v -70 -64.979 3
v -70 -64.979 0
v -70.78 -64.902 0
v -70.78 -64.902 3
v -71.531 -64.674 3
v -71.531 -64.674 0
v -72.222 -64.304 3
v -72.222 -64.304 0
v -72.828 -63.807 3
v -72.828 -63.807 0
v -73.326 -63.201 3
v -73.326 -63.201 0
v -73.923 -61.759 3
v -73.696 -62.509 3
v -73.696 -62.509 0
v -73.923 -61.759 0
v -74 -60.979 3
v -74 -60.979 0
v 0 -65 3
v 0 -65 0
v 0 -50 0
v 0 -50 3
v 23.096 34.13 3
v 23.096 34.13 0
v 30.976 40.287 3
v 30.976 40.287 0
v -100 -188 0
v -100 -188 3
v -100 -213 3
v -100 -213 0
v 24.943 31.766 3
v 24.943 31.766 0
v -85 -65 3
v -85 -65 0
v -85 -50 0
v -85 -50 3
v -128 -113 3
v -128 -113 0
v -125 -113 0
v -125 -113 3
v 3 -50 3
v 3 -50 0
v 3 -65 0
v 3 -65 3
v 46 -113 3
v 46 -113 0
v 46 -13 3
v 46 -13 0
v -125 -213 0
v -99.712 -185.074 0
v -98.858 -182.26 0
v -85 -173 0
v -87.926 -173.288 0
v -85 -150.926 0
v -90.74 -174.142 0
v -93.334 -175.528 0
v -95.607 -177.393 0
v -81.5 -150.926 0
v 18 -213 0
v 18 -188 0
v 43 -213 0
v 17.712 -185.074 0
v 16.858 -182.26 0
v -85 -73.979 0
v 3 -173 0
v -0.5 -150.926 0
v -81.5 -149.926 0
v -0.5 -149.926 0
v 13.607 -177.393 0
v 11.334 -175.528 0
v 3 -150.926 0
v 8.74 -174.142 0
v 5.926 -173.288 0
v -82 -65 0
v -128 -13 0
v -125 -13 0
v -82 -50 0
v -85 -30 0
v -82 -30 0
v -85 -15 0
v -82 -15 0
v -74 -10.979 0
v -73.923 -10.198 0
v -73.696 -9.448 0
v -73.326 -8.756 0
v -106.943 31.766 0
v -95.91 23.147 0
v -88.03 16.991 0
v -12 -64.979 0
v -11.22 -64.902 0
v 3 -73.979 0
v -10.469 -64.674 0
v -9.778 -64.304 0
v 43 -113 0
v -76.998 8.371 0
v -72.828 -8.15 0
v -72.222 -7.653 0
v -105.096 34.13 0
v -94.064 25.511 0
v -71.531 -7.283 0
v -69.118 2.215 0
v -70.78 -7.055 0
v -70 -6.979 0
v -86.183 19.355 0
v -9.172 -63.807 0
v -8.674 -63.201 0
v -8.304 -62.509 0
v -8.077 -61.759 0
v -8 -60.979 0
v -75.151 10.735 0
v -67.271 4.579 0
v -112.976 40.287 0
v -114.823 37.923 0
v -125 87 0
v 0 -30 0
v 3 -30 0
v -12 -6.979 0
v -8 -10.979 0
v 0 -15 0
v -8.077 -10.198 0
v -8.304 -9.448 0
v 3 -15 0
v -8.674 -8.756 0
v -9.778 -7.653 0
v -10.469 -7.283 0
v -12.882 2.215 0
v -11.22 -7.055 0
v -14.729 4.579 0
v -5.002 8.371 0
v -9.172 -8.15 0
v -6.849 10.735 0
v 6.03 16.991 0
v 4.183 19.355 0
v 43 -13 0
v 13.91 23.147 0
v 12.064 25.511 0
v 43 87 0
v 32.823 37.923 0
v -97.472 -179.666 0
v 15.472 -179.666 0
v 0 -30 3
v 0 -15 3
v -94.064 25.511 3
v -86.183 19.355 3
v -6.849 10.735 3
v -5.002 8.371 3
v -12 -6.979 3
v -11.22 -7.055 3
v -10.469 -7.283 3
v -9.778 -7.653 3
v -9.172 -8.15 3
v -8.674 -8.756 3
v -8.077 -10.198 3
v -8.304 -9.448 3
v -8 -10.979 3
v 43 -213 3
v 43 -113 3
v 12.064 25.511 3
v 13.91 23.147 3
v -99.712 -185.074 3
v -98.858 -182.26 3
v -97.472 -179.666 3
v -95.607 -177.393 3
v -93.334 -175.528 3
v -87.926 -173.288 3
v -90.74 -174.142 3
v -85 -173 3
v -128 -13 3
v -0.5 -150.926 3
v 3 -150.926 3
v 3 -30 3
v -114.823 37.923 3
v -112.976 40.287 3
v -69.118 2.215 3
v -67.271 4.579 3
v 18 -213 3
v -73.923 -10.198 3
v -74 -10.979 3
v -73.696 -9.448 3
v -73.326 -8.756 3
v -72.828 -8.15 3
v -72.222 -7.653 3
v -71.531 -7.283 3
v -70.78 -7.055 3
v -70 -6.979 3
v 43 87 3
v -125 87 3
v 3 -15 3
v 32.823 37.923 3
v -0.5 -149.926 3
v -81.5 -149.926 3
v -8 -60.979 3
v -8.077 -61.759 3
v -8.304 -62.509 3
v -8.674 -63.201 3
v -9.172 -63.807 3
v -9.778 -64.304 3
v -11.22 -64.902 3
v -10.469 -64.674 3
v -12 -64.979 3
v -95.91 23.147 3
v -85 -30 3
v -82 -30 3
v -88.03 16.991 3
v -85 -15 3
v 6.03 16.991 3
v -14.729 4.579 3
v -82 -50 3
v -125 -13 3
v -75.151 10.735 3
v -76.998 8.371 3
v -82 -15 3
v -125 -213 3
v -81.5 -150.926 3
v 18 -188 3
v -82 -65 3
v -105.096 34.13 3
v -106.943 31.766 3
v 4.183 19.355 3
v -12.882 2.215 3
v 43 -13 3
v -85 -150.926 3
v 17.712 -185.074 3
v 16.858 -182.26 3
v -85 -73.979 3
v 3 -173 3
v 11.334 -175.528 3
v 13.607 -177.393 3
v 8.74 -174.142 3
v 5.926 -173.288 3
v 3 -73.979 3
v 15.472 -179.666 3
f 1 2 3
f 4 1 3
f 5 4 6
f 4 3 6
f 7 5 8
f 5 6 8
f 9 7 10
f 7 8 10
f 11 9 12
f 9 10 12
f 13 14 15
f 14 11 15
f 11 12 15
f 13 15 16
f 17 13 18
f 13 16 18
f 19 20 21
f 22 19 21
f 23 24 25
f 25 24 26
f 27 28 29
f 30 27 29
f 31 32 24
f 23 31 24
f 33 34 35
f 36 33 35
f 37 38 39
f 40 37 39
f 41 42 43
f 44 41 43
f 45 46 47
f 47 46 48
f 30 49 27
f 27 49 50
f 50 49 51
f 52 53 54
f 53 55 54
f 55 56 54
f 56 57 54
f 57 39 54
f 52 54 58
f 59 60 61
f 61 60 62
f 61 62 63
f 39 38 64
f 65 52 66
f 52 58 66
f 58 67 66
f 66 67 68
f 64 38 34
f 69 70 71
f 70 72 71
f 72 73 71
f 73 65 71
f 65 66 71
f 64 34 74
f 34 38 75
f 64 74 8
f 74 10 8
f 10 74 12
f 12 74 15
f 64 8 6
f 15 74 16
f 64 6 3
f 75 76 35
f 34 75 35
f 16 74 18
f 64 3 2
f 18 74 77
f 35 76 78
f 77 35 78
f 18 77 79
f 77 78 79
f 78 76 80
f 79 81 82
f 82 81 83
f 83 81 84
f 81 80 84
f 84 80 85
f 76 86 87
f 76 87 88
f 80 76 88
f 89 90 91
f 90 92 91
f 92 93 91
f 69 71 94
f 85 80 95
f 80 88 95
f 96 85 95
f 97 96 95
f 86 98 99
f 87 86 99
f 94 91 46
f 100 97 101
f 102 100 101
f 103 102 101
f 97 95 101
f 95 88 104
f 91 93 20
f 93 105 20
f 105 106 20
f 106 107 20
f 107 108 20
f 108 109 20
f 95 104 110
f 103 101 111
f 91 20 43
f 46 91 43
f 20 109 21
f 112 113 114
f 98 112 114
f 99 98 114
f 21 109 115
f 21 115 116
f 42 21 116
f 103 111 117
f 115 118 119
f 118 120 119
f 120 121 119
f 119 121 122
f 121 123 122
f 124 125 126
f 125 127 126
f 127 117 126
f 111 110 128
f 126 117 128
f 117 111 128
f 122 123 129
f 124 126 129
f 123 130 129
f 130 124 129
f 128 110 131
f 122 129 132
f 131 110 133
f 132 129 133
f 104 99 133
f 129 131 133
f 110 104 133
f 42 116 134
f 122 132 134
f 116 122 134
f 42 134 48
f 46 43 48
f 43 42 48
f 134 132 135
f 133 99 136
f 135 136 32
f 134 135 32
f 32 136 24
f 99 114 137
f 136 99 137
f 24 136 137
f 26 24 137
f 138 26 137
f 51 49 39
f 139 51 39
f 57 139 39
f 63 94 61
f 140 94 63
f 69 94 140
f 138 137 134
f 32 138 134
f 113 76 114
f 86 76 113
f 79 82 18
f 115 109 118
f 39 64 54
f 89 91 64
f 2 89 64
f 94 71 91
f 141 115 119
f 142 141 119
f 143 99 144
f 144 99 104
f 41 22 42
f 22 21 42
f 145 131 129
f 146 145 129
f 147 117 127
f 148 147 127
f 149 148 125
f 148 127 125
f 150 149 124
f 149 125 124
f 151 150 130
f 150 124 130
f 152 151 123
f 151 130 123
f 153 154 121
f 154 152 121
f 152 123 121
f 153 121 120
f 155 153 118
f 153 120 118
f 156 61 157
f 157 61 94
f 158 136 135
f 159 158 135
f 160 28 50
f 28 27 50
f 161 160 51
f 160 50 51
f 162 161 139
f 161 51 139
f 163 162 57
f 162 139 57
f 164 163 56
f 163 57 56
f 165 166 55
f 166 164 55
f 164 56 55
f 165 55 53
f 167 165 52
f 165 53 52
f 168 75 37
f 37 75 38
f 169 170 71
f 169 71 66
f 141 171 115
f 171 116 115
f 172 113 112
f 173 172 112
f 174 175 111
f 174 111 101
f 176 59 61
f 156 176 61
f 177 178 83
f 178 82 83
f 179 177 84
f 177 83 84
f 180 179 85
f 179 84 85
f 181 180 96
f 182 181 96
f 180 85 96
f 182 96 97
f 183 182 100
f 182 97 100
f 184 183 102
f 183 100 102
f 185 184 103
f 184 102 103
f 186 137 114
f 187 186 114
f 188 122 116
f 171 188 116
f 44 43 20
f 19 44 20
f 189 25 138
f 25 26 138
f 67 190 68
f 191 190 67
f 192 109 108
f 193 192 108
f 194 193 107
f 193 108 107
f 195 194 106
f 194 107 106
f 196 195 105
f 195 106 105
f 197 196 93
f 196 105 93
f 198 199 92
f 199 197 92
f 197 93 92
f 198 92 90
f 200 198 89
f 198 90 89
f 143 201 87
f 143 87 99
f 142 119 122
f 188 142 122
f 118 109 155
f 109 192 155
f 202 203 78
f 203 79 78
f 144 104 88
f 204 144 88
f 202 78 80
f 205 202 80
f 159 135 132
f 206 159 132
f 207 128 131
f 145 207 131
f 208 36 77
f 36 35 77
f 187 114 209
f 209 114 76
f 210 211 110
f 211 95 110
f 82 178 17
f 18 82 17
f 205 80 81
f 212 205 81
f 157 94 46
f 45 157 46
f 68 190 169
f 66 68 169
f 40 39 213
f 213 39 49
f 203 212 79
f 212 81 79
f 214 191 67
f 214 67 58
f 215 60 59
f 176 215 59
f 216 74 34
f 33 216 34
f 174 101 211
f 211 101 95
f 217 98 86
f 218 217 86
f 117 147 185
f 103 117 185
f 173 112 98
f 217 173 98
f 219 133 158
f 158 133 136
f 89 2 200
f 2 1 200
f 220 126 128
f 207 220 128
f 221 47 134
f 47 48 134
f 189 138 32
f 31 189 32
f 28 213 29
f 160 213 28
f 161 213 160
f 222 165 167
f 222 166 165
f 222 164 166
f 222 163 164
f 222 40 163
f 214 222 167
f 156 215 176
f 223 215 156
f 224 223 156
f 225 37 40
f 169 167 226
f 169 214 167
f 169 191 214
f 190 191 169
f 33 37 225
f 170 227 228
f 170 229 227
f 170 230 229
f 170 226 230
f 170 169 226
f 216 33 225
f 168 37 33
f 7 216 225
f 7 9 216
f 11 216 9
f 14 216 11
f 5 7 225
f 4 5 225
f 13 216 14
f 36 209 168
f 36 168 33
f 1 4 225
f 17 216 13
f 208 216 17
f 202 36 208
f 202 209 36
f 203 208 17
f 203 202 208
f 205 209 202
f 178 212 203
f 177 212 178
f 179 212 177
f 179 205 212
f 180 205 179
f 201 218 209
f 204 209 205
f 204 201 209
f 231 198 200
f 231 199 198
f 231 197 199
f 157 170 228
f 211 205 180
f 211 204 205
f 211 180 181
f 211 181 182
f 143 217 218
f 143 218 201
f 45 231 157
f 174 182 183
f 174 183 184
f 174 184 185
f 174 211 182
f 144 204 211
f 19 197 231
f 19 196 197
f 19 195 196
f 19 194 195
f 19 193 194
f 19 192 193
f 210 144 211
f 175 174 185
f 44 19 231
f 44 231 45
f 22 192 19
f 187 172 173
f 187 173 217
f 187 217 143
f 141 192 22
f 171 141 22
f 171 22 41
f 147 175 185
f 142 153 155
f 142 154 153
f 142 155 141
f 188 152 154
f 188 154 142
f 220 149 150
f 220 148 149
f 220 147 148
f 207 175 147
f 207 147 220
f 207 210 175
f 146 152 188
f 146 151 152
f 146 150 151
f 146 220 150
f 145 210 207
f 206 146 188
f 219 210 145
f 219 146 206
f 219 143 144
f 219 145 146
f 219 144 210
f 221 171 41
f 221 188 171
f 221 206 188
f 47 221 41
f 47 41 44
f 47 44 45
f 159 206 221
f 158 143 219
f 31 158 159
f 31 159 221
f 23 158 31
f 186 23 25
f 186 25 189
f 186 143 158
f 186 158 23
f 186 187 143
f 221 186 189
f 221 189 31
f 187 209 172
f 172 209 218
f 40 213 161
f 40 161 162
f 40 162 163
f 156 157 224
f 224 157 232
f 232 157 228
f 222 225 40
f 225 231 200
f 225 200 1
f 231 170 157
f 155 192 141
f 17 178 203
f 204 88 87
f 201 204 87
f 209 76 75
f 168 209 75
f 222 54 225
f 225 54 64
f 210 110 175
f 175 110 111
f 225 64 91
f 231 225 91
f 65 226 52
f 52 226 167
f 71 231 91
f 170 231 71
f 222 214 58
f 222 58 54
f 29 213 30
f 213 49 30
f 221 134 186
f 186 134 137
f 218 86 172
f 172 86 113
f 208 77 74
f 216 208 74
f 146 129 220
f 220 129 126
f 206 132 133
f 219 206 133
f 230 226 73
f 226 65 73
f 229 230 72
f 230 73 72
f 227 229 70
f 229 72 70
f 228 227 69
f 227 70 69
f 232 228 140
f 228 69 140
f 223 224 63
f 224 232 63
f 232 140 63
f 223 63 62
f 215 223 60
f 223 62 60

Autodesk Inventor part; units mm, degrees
ref_plane "YZ Plane" through (0, 0, 0) normal (1, 0, 0) x (0, 1, 0)
ref_plane "XZ Plane" through (0, 0, 0) normal (0, 1, 0) x (-1, 0, 0)
ref_plane "XY Plane" through (0, 0, 0) normal (0, 0, 1) x (1, 0, 0)
sketch "Sketch1" plane through (0, 0, 0) normal (0, 0, 1) x (1, 0, 0)
  line L0 (-76.9983, 8.3713) -> (-75.1513, 10.7353) projected
  line L1 (-75.1513, 10.7353) -> (-67.2712, 4.5787) projected
  line L2 (-67.2712, 4.5787) -> (-69.1182, 2.2147) projected
  line L3 (-69.1182, 2.2147) -> (-76.9983, 8.3713) projected
  line L4 (-86.1834, 19.3546) -> (-88.0304, 16.9906) projected
  line L5 (-88.0304, 16.9906) -> (-95.9105, 23.1472) projected
  line L6 (-95.9105, 23.1472) -> (-94.0636, 25.5112) projected
  line L7 (-94.0636, 25.5112) -> (-86.1834, 19.3546) projected
  line L8 (-106.9427, 31.7664) -> (-114.8228, 37.9231) projected
  line L9 (-114.8228, 37.9231) -> (-112.9758, 40.2871) projected
  line L10 (-112.9758, 40.2871) -> (-105.0957, 34.1305) projected
  line L11 (-105.0957, 34.1305) -> (-106.9427, 31.7664) projected
  line L12 (-6.8487, 10.7353) -> (-5.0017, 8.3713) projected
  line L13 (-5.0017, 8.3713) -> (-12.8818, 2.2147) projected
  line L14 (-12.8818, 2.2147) -> (-14.7288, 4.5787) projected
  line L15 (-14.7288, 4.5787) -> (-6.8487, 10.7353) projected
  line L16 (6.0304, 16.9906) -> (4.1834, 19.3546) projected
  line L17 (4.1834, 19.3546) -> (12.0636, 25.5112) projected
  line L18 (12.0636, 25.5112) -> (13.9105, 23.1472) projected
  line L19 (13.9105, 23.1472) -> (6.0304, 16.9906) projected
  line L20 (32.8228, 37.9231) -> (24.9427, 31.7664) projected
  line L21 (24.9427, 31.7664) -> (23.0957, 34.1305) projected
  line L22 (23.0957, 34.1305) -> (30.9758, 40.2871) projected
  line L23 (30.9758, 40.2871) -> (32.8228, 37.9231) projected
  line L24 (-82, 0) -> (-82, -73.9786) construction
  line L25 (-82, -73.9786) -> (-82, -147.5817) construction
  line L26 (-82, -147.5817) -> (-85, -147.5817)
  line L27 (-85, -147.5817) -> (-85, -73.9786)
  line L28 (-85, -73.9786) -> (-85, 0) construction
  line L29 (-85, 0) -> (-82, 0) construction
  line L30 (-85, -73.9786) -> (-82, -73.9786)
  line L31 (3, 0) -> (3, -73.9786) construction
  line L32 (3, -73.9786) -> (3, -147.5817)
  line L33 (3, -147.5817) -> (0, -147.5817)
  line L34 (0, -147.5817) -> (0, -73.9786) construction
  line L35 (0, -73.9786) -> (0, 0) construction
  line L36 (0, 0) -> (3, 0) construction
  line L37 (0, -73.9786) -> (3, -73.9786)
  line L38 (-82, -143.7746) -> (0, -143.7746) construction
  line L39 (0, -143.7746) -> (0, -147.5817)
  line L40 (0, -147.5817) -> (-82, -147.5817)
  line L41 (-82, -147.5817) -> (-82, -143.7746)
  line L42 (-82, -73.9786) -> (0, -73.9786)
  line L43 (-85, -65) -> (-85, -50) projected
  line L44 (-85, -50) -> (-82, -50) projected
  line L45 (-82, -50) -> (-82, -65) projected
  line L46 (-82, -65) -> (-85, -65) projected
  line L47 (3, -50) -> (3, -65) projected
  line L48 (3, -65) -> (0, -65) projected
  line L49 (0, -65) -> (0, -50) projected
  line L50 (0, -50) -> (3, -50) projected
  line L51 (-82, -30) -> (-85, -30) projected
  line L52 (-85, -30) -> (-85, -15) projected
  line L53 (-85, -15) -> (-82, -15) projected
  line L54 (-82, -15) -> (-82, -30) projected
  line L55 (3, -30) -> (0, -30) projected
  line L56 (0, -30) -> (0, -15) projected
  line L57 (0, -15) -> (3, -15) projected
  line L58 (3, -15) -> (3, -30) projected
  line L59 (43, 87) -> (-125, 87) projected
  line L60 (-128, -13) -> (-128, -113) projected
  line L61 (18, -213) -> (43, -213) projected
  line L62 (46, -113) -> (46, -13) projected
  line L63 (-125, -113) -> (-125, -213) projected
  line L64 (43, -213) -> (43, -113) projected
  line L65 (43, -113) -> (46, -113) projected
  line L66 (46, -13) -> (43, -13) projected
  line L67 (43, -13) -> (43, 87) projected
  line L68 (-125, 87) -> (-125, -13) projected
  line L69 (-125, -13) -> (-128, -13) projected
  line L70 (-128, -113) -> (-125, -113) projected
  line L71 (-100, -213) -> (-100, -188) projected
  arc A0 (-85, -173) -> (-100, -188) centre (-85, -188) ccw projected
  line L72 (-85, -173) -> (3, -173) projected
  arc A1 (18, -188) -> (3, -173) centre (3, -188) ccw projected
  line L73 (18, -188) -> (18, -213) projected
  line L74 (-125, -213) -> (-100, -213) projected
extrude "Extrusion1" add sketch "Sketch1" along normal blind 3
sketch "Sketch2" plane through (0, 0, 3) normal (0, 0, 1) x (1, 0, 0)
  line L0 (-82, -76.3225) -> (-82, -149.9255)
  line L1 (-82, -149.9255) -> (-85, -149.9255)
  line L2 (-85, -149.9255) -> (-85, -76.3225)
  line L3 (-85, -76.3225) -> (-82, -76.3225)
  line L4 (-82, -146.1185) -> (0, -146.1185)
  line L5 (0, -146.1185) -> (0, -149.9255)
  line L6 (0, -149.9255) -> (-82, -149.9255)
  line L7 (-82, -149.9255) -> (-82, -146.1185)
  line L8 (3, -76.3225) -> (3, -149.9255)
  line L9 (3, -149.9255) -> (0, -149.9255)
  line L10 (0, -149.9255) -> (0, -76.3225)
  line L11 (0, -76.3225) -> (3, -76.3225)
  point P0 (0, 0)
extrude "Extrusion2" cut sketch "Sketch2" against normal blind 10
sketch "Sketch4" plane through (0, 0, 3) normal (0, 0, 1) x (1, 0, 0)
  line L0 (-85, -149.9255) -> (3, -149.9255) projected
  line L1 (-85, -149.9255) -> (3, -149.9255)
  line L2 (3, -149.9255) -> (3, -150.9255)
  line L3 (3, -150.9255) -> (-85, -150.9255)
  line L4 (-85, -150.9255) -> (-85, -149.9255)
  line L5 (3, -73.9786) -> (3, -149.9255) projected
  line L6 (3, -149.9255) -> (-85, -149.9255) projected
  line L7 (-0.5, -149.9255) -> (-0.5, -150.9255)
  line L8 (-81.5, -149.9255) -> (-81.5, -150.9255)
  point P0 (0, 0)
  point P1 (3, -149.9255)
  dimension "d6" = 1
  dimension "d22" = 3.5
  dimension "d23" = 3.5
extrude "Extrusion4" cut sketch "Sketch4" against normal blind 10 contours L0 L8 L3 L4 | L0 L2 L3 L7
sketch "Sketch6" plane through (0, 0, 3) normal (0, 0, 1) x (1, 0, 0)
  line L0 (-100, -213) -> (18, -213)
  line L1 (18, -213) -> (18, -173)
  line L2 (18, -173) -> (-100, -173)
  line L3 (-100, -173) -> (-100, -213)
  line L4 (-125, -113) -> (-125, -213) projected
  line L5 (43, -213) -> (43, -113) projected
  line L6 (-125, -213) -> (43, -213) projected
  point P0 (0, 0)
  dimension "d9" = 25
  dimension "d10" = 25
  dimension "d11" = 40
extrude "Extrusion5" cut sketch "Sketch6" against normal blind 10
fillet "Fillet1" radius 15 2 edges at (-100, -173, 1.5) (18, -173, 1.5)
sketch "Sketch7" plane through (0, 0, 3) normal (0, 0, 1) x (1, 0, 0)
  line L0 (-74, -64.9786) -> (-8, -64.9786)
  line L1 (-8, -64.9786) -> (-8, -6.9786)
  line L2 (-8, -6.9786) -> (-74, -6.9786)
  line L3 (-74, -6.9786) -> (-74, -64.9786)
  line L4 (0, -65) -> (0, -50) projected
  line L5 (-82, -50) -> (-82, -65) projected
  line L6 (-85, -73.9786) -> (3, -73.9786) projected
  dimension "d15" = 8
  dimension "d16" = 8
  dimension "d17" = 9
  dimension "d18" = 58
extrude "Extrusion6" cut sketch "Sketch7" against normal blind 10
fillet "Fillet2" radius 4 4 edges at (-74, -6.9786, 1.5) (-8, -6.9786, 1.5) (-8, -64.9786, 1.5) (-74, -64.9786, 1.5)
properties part number "Pared_Frontal"
